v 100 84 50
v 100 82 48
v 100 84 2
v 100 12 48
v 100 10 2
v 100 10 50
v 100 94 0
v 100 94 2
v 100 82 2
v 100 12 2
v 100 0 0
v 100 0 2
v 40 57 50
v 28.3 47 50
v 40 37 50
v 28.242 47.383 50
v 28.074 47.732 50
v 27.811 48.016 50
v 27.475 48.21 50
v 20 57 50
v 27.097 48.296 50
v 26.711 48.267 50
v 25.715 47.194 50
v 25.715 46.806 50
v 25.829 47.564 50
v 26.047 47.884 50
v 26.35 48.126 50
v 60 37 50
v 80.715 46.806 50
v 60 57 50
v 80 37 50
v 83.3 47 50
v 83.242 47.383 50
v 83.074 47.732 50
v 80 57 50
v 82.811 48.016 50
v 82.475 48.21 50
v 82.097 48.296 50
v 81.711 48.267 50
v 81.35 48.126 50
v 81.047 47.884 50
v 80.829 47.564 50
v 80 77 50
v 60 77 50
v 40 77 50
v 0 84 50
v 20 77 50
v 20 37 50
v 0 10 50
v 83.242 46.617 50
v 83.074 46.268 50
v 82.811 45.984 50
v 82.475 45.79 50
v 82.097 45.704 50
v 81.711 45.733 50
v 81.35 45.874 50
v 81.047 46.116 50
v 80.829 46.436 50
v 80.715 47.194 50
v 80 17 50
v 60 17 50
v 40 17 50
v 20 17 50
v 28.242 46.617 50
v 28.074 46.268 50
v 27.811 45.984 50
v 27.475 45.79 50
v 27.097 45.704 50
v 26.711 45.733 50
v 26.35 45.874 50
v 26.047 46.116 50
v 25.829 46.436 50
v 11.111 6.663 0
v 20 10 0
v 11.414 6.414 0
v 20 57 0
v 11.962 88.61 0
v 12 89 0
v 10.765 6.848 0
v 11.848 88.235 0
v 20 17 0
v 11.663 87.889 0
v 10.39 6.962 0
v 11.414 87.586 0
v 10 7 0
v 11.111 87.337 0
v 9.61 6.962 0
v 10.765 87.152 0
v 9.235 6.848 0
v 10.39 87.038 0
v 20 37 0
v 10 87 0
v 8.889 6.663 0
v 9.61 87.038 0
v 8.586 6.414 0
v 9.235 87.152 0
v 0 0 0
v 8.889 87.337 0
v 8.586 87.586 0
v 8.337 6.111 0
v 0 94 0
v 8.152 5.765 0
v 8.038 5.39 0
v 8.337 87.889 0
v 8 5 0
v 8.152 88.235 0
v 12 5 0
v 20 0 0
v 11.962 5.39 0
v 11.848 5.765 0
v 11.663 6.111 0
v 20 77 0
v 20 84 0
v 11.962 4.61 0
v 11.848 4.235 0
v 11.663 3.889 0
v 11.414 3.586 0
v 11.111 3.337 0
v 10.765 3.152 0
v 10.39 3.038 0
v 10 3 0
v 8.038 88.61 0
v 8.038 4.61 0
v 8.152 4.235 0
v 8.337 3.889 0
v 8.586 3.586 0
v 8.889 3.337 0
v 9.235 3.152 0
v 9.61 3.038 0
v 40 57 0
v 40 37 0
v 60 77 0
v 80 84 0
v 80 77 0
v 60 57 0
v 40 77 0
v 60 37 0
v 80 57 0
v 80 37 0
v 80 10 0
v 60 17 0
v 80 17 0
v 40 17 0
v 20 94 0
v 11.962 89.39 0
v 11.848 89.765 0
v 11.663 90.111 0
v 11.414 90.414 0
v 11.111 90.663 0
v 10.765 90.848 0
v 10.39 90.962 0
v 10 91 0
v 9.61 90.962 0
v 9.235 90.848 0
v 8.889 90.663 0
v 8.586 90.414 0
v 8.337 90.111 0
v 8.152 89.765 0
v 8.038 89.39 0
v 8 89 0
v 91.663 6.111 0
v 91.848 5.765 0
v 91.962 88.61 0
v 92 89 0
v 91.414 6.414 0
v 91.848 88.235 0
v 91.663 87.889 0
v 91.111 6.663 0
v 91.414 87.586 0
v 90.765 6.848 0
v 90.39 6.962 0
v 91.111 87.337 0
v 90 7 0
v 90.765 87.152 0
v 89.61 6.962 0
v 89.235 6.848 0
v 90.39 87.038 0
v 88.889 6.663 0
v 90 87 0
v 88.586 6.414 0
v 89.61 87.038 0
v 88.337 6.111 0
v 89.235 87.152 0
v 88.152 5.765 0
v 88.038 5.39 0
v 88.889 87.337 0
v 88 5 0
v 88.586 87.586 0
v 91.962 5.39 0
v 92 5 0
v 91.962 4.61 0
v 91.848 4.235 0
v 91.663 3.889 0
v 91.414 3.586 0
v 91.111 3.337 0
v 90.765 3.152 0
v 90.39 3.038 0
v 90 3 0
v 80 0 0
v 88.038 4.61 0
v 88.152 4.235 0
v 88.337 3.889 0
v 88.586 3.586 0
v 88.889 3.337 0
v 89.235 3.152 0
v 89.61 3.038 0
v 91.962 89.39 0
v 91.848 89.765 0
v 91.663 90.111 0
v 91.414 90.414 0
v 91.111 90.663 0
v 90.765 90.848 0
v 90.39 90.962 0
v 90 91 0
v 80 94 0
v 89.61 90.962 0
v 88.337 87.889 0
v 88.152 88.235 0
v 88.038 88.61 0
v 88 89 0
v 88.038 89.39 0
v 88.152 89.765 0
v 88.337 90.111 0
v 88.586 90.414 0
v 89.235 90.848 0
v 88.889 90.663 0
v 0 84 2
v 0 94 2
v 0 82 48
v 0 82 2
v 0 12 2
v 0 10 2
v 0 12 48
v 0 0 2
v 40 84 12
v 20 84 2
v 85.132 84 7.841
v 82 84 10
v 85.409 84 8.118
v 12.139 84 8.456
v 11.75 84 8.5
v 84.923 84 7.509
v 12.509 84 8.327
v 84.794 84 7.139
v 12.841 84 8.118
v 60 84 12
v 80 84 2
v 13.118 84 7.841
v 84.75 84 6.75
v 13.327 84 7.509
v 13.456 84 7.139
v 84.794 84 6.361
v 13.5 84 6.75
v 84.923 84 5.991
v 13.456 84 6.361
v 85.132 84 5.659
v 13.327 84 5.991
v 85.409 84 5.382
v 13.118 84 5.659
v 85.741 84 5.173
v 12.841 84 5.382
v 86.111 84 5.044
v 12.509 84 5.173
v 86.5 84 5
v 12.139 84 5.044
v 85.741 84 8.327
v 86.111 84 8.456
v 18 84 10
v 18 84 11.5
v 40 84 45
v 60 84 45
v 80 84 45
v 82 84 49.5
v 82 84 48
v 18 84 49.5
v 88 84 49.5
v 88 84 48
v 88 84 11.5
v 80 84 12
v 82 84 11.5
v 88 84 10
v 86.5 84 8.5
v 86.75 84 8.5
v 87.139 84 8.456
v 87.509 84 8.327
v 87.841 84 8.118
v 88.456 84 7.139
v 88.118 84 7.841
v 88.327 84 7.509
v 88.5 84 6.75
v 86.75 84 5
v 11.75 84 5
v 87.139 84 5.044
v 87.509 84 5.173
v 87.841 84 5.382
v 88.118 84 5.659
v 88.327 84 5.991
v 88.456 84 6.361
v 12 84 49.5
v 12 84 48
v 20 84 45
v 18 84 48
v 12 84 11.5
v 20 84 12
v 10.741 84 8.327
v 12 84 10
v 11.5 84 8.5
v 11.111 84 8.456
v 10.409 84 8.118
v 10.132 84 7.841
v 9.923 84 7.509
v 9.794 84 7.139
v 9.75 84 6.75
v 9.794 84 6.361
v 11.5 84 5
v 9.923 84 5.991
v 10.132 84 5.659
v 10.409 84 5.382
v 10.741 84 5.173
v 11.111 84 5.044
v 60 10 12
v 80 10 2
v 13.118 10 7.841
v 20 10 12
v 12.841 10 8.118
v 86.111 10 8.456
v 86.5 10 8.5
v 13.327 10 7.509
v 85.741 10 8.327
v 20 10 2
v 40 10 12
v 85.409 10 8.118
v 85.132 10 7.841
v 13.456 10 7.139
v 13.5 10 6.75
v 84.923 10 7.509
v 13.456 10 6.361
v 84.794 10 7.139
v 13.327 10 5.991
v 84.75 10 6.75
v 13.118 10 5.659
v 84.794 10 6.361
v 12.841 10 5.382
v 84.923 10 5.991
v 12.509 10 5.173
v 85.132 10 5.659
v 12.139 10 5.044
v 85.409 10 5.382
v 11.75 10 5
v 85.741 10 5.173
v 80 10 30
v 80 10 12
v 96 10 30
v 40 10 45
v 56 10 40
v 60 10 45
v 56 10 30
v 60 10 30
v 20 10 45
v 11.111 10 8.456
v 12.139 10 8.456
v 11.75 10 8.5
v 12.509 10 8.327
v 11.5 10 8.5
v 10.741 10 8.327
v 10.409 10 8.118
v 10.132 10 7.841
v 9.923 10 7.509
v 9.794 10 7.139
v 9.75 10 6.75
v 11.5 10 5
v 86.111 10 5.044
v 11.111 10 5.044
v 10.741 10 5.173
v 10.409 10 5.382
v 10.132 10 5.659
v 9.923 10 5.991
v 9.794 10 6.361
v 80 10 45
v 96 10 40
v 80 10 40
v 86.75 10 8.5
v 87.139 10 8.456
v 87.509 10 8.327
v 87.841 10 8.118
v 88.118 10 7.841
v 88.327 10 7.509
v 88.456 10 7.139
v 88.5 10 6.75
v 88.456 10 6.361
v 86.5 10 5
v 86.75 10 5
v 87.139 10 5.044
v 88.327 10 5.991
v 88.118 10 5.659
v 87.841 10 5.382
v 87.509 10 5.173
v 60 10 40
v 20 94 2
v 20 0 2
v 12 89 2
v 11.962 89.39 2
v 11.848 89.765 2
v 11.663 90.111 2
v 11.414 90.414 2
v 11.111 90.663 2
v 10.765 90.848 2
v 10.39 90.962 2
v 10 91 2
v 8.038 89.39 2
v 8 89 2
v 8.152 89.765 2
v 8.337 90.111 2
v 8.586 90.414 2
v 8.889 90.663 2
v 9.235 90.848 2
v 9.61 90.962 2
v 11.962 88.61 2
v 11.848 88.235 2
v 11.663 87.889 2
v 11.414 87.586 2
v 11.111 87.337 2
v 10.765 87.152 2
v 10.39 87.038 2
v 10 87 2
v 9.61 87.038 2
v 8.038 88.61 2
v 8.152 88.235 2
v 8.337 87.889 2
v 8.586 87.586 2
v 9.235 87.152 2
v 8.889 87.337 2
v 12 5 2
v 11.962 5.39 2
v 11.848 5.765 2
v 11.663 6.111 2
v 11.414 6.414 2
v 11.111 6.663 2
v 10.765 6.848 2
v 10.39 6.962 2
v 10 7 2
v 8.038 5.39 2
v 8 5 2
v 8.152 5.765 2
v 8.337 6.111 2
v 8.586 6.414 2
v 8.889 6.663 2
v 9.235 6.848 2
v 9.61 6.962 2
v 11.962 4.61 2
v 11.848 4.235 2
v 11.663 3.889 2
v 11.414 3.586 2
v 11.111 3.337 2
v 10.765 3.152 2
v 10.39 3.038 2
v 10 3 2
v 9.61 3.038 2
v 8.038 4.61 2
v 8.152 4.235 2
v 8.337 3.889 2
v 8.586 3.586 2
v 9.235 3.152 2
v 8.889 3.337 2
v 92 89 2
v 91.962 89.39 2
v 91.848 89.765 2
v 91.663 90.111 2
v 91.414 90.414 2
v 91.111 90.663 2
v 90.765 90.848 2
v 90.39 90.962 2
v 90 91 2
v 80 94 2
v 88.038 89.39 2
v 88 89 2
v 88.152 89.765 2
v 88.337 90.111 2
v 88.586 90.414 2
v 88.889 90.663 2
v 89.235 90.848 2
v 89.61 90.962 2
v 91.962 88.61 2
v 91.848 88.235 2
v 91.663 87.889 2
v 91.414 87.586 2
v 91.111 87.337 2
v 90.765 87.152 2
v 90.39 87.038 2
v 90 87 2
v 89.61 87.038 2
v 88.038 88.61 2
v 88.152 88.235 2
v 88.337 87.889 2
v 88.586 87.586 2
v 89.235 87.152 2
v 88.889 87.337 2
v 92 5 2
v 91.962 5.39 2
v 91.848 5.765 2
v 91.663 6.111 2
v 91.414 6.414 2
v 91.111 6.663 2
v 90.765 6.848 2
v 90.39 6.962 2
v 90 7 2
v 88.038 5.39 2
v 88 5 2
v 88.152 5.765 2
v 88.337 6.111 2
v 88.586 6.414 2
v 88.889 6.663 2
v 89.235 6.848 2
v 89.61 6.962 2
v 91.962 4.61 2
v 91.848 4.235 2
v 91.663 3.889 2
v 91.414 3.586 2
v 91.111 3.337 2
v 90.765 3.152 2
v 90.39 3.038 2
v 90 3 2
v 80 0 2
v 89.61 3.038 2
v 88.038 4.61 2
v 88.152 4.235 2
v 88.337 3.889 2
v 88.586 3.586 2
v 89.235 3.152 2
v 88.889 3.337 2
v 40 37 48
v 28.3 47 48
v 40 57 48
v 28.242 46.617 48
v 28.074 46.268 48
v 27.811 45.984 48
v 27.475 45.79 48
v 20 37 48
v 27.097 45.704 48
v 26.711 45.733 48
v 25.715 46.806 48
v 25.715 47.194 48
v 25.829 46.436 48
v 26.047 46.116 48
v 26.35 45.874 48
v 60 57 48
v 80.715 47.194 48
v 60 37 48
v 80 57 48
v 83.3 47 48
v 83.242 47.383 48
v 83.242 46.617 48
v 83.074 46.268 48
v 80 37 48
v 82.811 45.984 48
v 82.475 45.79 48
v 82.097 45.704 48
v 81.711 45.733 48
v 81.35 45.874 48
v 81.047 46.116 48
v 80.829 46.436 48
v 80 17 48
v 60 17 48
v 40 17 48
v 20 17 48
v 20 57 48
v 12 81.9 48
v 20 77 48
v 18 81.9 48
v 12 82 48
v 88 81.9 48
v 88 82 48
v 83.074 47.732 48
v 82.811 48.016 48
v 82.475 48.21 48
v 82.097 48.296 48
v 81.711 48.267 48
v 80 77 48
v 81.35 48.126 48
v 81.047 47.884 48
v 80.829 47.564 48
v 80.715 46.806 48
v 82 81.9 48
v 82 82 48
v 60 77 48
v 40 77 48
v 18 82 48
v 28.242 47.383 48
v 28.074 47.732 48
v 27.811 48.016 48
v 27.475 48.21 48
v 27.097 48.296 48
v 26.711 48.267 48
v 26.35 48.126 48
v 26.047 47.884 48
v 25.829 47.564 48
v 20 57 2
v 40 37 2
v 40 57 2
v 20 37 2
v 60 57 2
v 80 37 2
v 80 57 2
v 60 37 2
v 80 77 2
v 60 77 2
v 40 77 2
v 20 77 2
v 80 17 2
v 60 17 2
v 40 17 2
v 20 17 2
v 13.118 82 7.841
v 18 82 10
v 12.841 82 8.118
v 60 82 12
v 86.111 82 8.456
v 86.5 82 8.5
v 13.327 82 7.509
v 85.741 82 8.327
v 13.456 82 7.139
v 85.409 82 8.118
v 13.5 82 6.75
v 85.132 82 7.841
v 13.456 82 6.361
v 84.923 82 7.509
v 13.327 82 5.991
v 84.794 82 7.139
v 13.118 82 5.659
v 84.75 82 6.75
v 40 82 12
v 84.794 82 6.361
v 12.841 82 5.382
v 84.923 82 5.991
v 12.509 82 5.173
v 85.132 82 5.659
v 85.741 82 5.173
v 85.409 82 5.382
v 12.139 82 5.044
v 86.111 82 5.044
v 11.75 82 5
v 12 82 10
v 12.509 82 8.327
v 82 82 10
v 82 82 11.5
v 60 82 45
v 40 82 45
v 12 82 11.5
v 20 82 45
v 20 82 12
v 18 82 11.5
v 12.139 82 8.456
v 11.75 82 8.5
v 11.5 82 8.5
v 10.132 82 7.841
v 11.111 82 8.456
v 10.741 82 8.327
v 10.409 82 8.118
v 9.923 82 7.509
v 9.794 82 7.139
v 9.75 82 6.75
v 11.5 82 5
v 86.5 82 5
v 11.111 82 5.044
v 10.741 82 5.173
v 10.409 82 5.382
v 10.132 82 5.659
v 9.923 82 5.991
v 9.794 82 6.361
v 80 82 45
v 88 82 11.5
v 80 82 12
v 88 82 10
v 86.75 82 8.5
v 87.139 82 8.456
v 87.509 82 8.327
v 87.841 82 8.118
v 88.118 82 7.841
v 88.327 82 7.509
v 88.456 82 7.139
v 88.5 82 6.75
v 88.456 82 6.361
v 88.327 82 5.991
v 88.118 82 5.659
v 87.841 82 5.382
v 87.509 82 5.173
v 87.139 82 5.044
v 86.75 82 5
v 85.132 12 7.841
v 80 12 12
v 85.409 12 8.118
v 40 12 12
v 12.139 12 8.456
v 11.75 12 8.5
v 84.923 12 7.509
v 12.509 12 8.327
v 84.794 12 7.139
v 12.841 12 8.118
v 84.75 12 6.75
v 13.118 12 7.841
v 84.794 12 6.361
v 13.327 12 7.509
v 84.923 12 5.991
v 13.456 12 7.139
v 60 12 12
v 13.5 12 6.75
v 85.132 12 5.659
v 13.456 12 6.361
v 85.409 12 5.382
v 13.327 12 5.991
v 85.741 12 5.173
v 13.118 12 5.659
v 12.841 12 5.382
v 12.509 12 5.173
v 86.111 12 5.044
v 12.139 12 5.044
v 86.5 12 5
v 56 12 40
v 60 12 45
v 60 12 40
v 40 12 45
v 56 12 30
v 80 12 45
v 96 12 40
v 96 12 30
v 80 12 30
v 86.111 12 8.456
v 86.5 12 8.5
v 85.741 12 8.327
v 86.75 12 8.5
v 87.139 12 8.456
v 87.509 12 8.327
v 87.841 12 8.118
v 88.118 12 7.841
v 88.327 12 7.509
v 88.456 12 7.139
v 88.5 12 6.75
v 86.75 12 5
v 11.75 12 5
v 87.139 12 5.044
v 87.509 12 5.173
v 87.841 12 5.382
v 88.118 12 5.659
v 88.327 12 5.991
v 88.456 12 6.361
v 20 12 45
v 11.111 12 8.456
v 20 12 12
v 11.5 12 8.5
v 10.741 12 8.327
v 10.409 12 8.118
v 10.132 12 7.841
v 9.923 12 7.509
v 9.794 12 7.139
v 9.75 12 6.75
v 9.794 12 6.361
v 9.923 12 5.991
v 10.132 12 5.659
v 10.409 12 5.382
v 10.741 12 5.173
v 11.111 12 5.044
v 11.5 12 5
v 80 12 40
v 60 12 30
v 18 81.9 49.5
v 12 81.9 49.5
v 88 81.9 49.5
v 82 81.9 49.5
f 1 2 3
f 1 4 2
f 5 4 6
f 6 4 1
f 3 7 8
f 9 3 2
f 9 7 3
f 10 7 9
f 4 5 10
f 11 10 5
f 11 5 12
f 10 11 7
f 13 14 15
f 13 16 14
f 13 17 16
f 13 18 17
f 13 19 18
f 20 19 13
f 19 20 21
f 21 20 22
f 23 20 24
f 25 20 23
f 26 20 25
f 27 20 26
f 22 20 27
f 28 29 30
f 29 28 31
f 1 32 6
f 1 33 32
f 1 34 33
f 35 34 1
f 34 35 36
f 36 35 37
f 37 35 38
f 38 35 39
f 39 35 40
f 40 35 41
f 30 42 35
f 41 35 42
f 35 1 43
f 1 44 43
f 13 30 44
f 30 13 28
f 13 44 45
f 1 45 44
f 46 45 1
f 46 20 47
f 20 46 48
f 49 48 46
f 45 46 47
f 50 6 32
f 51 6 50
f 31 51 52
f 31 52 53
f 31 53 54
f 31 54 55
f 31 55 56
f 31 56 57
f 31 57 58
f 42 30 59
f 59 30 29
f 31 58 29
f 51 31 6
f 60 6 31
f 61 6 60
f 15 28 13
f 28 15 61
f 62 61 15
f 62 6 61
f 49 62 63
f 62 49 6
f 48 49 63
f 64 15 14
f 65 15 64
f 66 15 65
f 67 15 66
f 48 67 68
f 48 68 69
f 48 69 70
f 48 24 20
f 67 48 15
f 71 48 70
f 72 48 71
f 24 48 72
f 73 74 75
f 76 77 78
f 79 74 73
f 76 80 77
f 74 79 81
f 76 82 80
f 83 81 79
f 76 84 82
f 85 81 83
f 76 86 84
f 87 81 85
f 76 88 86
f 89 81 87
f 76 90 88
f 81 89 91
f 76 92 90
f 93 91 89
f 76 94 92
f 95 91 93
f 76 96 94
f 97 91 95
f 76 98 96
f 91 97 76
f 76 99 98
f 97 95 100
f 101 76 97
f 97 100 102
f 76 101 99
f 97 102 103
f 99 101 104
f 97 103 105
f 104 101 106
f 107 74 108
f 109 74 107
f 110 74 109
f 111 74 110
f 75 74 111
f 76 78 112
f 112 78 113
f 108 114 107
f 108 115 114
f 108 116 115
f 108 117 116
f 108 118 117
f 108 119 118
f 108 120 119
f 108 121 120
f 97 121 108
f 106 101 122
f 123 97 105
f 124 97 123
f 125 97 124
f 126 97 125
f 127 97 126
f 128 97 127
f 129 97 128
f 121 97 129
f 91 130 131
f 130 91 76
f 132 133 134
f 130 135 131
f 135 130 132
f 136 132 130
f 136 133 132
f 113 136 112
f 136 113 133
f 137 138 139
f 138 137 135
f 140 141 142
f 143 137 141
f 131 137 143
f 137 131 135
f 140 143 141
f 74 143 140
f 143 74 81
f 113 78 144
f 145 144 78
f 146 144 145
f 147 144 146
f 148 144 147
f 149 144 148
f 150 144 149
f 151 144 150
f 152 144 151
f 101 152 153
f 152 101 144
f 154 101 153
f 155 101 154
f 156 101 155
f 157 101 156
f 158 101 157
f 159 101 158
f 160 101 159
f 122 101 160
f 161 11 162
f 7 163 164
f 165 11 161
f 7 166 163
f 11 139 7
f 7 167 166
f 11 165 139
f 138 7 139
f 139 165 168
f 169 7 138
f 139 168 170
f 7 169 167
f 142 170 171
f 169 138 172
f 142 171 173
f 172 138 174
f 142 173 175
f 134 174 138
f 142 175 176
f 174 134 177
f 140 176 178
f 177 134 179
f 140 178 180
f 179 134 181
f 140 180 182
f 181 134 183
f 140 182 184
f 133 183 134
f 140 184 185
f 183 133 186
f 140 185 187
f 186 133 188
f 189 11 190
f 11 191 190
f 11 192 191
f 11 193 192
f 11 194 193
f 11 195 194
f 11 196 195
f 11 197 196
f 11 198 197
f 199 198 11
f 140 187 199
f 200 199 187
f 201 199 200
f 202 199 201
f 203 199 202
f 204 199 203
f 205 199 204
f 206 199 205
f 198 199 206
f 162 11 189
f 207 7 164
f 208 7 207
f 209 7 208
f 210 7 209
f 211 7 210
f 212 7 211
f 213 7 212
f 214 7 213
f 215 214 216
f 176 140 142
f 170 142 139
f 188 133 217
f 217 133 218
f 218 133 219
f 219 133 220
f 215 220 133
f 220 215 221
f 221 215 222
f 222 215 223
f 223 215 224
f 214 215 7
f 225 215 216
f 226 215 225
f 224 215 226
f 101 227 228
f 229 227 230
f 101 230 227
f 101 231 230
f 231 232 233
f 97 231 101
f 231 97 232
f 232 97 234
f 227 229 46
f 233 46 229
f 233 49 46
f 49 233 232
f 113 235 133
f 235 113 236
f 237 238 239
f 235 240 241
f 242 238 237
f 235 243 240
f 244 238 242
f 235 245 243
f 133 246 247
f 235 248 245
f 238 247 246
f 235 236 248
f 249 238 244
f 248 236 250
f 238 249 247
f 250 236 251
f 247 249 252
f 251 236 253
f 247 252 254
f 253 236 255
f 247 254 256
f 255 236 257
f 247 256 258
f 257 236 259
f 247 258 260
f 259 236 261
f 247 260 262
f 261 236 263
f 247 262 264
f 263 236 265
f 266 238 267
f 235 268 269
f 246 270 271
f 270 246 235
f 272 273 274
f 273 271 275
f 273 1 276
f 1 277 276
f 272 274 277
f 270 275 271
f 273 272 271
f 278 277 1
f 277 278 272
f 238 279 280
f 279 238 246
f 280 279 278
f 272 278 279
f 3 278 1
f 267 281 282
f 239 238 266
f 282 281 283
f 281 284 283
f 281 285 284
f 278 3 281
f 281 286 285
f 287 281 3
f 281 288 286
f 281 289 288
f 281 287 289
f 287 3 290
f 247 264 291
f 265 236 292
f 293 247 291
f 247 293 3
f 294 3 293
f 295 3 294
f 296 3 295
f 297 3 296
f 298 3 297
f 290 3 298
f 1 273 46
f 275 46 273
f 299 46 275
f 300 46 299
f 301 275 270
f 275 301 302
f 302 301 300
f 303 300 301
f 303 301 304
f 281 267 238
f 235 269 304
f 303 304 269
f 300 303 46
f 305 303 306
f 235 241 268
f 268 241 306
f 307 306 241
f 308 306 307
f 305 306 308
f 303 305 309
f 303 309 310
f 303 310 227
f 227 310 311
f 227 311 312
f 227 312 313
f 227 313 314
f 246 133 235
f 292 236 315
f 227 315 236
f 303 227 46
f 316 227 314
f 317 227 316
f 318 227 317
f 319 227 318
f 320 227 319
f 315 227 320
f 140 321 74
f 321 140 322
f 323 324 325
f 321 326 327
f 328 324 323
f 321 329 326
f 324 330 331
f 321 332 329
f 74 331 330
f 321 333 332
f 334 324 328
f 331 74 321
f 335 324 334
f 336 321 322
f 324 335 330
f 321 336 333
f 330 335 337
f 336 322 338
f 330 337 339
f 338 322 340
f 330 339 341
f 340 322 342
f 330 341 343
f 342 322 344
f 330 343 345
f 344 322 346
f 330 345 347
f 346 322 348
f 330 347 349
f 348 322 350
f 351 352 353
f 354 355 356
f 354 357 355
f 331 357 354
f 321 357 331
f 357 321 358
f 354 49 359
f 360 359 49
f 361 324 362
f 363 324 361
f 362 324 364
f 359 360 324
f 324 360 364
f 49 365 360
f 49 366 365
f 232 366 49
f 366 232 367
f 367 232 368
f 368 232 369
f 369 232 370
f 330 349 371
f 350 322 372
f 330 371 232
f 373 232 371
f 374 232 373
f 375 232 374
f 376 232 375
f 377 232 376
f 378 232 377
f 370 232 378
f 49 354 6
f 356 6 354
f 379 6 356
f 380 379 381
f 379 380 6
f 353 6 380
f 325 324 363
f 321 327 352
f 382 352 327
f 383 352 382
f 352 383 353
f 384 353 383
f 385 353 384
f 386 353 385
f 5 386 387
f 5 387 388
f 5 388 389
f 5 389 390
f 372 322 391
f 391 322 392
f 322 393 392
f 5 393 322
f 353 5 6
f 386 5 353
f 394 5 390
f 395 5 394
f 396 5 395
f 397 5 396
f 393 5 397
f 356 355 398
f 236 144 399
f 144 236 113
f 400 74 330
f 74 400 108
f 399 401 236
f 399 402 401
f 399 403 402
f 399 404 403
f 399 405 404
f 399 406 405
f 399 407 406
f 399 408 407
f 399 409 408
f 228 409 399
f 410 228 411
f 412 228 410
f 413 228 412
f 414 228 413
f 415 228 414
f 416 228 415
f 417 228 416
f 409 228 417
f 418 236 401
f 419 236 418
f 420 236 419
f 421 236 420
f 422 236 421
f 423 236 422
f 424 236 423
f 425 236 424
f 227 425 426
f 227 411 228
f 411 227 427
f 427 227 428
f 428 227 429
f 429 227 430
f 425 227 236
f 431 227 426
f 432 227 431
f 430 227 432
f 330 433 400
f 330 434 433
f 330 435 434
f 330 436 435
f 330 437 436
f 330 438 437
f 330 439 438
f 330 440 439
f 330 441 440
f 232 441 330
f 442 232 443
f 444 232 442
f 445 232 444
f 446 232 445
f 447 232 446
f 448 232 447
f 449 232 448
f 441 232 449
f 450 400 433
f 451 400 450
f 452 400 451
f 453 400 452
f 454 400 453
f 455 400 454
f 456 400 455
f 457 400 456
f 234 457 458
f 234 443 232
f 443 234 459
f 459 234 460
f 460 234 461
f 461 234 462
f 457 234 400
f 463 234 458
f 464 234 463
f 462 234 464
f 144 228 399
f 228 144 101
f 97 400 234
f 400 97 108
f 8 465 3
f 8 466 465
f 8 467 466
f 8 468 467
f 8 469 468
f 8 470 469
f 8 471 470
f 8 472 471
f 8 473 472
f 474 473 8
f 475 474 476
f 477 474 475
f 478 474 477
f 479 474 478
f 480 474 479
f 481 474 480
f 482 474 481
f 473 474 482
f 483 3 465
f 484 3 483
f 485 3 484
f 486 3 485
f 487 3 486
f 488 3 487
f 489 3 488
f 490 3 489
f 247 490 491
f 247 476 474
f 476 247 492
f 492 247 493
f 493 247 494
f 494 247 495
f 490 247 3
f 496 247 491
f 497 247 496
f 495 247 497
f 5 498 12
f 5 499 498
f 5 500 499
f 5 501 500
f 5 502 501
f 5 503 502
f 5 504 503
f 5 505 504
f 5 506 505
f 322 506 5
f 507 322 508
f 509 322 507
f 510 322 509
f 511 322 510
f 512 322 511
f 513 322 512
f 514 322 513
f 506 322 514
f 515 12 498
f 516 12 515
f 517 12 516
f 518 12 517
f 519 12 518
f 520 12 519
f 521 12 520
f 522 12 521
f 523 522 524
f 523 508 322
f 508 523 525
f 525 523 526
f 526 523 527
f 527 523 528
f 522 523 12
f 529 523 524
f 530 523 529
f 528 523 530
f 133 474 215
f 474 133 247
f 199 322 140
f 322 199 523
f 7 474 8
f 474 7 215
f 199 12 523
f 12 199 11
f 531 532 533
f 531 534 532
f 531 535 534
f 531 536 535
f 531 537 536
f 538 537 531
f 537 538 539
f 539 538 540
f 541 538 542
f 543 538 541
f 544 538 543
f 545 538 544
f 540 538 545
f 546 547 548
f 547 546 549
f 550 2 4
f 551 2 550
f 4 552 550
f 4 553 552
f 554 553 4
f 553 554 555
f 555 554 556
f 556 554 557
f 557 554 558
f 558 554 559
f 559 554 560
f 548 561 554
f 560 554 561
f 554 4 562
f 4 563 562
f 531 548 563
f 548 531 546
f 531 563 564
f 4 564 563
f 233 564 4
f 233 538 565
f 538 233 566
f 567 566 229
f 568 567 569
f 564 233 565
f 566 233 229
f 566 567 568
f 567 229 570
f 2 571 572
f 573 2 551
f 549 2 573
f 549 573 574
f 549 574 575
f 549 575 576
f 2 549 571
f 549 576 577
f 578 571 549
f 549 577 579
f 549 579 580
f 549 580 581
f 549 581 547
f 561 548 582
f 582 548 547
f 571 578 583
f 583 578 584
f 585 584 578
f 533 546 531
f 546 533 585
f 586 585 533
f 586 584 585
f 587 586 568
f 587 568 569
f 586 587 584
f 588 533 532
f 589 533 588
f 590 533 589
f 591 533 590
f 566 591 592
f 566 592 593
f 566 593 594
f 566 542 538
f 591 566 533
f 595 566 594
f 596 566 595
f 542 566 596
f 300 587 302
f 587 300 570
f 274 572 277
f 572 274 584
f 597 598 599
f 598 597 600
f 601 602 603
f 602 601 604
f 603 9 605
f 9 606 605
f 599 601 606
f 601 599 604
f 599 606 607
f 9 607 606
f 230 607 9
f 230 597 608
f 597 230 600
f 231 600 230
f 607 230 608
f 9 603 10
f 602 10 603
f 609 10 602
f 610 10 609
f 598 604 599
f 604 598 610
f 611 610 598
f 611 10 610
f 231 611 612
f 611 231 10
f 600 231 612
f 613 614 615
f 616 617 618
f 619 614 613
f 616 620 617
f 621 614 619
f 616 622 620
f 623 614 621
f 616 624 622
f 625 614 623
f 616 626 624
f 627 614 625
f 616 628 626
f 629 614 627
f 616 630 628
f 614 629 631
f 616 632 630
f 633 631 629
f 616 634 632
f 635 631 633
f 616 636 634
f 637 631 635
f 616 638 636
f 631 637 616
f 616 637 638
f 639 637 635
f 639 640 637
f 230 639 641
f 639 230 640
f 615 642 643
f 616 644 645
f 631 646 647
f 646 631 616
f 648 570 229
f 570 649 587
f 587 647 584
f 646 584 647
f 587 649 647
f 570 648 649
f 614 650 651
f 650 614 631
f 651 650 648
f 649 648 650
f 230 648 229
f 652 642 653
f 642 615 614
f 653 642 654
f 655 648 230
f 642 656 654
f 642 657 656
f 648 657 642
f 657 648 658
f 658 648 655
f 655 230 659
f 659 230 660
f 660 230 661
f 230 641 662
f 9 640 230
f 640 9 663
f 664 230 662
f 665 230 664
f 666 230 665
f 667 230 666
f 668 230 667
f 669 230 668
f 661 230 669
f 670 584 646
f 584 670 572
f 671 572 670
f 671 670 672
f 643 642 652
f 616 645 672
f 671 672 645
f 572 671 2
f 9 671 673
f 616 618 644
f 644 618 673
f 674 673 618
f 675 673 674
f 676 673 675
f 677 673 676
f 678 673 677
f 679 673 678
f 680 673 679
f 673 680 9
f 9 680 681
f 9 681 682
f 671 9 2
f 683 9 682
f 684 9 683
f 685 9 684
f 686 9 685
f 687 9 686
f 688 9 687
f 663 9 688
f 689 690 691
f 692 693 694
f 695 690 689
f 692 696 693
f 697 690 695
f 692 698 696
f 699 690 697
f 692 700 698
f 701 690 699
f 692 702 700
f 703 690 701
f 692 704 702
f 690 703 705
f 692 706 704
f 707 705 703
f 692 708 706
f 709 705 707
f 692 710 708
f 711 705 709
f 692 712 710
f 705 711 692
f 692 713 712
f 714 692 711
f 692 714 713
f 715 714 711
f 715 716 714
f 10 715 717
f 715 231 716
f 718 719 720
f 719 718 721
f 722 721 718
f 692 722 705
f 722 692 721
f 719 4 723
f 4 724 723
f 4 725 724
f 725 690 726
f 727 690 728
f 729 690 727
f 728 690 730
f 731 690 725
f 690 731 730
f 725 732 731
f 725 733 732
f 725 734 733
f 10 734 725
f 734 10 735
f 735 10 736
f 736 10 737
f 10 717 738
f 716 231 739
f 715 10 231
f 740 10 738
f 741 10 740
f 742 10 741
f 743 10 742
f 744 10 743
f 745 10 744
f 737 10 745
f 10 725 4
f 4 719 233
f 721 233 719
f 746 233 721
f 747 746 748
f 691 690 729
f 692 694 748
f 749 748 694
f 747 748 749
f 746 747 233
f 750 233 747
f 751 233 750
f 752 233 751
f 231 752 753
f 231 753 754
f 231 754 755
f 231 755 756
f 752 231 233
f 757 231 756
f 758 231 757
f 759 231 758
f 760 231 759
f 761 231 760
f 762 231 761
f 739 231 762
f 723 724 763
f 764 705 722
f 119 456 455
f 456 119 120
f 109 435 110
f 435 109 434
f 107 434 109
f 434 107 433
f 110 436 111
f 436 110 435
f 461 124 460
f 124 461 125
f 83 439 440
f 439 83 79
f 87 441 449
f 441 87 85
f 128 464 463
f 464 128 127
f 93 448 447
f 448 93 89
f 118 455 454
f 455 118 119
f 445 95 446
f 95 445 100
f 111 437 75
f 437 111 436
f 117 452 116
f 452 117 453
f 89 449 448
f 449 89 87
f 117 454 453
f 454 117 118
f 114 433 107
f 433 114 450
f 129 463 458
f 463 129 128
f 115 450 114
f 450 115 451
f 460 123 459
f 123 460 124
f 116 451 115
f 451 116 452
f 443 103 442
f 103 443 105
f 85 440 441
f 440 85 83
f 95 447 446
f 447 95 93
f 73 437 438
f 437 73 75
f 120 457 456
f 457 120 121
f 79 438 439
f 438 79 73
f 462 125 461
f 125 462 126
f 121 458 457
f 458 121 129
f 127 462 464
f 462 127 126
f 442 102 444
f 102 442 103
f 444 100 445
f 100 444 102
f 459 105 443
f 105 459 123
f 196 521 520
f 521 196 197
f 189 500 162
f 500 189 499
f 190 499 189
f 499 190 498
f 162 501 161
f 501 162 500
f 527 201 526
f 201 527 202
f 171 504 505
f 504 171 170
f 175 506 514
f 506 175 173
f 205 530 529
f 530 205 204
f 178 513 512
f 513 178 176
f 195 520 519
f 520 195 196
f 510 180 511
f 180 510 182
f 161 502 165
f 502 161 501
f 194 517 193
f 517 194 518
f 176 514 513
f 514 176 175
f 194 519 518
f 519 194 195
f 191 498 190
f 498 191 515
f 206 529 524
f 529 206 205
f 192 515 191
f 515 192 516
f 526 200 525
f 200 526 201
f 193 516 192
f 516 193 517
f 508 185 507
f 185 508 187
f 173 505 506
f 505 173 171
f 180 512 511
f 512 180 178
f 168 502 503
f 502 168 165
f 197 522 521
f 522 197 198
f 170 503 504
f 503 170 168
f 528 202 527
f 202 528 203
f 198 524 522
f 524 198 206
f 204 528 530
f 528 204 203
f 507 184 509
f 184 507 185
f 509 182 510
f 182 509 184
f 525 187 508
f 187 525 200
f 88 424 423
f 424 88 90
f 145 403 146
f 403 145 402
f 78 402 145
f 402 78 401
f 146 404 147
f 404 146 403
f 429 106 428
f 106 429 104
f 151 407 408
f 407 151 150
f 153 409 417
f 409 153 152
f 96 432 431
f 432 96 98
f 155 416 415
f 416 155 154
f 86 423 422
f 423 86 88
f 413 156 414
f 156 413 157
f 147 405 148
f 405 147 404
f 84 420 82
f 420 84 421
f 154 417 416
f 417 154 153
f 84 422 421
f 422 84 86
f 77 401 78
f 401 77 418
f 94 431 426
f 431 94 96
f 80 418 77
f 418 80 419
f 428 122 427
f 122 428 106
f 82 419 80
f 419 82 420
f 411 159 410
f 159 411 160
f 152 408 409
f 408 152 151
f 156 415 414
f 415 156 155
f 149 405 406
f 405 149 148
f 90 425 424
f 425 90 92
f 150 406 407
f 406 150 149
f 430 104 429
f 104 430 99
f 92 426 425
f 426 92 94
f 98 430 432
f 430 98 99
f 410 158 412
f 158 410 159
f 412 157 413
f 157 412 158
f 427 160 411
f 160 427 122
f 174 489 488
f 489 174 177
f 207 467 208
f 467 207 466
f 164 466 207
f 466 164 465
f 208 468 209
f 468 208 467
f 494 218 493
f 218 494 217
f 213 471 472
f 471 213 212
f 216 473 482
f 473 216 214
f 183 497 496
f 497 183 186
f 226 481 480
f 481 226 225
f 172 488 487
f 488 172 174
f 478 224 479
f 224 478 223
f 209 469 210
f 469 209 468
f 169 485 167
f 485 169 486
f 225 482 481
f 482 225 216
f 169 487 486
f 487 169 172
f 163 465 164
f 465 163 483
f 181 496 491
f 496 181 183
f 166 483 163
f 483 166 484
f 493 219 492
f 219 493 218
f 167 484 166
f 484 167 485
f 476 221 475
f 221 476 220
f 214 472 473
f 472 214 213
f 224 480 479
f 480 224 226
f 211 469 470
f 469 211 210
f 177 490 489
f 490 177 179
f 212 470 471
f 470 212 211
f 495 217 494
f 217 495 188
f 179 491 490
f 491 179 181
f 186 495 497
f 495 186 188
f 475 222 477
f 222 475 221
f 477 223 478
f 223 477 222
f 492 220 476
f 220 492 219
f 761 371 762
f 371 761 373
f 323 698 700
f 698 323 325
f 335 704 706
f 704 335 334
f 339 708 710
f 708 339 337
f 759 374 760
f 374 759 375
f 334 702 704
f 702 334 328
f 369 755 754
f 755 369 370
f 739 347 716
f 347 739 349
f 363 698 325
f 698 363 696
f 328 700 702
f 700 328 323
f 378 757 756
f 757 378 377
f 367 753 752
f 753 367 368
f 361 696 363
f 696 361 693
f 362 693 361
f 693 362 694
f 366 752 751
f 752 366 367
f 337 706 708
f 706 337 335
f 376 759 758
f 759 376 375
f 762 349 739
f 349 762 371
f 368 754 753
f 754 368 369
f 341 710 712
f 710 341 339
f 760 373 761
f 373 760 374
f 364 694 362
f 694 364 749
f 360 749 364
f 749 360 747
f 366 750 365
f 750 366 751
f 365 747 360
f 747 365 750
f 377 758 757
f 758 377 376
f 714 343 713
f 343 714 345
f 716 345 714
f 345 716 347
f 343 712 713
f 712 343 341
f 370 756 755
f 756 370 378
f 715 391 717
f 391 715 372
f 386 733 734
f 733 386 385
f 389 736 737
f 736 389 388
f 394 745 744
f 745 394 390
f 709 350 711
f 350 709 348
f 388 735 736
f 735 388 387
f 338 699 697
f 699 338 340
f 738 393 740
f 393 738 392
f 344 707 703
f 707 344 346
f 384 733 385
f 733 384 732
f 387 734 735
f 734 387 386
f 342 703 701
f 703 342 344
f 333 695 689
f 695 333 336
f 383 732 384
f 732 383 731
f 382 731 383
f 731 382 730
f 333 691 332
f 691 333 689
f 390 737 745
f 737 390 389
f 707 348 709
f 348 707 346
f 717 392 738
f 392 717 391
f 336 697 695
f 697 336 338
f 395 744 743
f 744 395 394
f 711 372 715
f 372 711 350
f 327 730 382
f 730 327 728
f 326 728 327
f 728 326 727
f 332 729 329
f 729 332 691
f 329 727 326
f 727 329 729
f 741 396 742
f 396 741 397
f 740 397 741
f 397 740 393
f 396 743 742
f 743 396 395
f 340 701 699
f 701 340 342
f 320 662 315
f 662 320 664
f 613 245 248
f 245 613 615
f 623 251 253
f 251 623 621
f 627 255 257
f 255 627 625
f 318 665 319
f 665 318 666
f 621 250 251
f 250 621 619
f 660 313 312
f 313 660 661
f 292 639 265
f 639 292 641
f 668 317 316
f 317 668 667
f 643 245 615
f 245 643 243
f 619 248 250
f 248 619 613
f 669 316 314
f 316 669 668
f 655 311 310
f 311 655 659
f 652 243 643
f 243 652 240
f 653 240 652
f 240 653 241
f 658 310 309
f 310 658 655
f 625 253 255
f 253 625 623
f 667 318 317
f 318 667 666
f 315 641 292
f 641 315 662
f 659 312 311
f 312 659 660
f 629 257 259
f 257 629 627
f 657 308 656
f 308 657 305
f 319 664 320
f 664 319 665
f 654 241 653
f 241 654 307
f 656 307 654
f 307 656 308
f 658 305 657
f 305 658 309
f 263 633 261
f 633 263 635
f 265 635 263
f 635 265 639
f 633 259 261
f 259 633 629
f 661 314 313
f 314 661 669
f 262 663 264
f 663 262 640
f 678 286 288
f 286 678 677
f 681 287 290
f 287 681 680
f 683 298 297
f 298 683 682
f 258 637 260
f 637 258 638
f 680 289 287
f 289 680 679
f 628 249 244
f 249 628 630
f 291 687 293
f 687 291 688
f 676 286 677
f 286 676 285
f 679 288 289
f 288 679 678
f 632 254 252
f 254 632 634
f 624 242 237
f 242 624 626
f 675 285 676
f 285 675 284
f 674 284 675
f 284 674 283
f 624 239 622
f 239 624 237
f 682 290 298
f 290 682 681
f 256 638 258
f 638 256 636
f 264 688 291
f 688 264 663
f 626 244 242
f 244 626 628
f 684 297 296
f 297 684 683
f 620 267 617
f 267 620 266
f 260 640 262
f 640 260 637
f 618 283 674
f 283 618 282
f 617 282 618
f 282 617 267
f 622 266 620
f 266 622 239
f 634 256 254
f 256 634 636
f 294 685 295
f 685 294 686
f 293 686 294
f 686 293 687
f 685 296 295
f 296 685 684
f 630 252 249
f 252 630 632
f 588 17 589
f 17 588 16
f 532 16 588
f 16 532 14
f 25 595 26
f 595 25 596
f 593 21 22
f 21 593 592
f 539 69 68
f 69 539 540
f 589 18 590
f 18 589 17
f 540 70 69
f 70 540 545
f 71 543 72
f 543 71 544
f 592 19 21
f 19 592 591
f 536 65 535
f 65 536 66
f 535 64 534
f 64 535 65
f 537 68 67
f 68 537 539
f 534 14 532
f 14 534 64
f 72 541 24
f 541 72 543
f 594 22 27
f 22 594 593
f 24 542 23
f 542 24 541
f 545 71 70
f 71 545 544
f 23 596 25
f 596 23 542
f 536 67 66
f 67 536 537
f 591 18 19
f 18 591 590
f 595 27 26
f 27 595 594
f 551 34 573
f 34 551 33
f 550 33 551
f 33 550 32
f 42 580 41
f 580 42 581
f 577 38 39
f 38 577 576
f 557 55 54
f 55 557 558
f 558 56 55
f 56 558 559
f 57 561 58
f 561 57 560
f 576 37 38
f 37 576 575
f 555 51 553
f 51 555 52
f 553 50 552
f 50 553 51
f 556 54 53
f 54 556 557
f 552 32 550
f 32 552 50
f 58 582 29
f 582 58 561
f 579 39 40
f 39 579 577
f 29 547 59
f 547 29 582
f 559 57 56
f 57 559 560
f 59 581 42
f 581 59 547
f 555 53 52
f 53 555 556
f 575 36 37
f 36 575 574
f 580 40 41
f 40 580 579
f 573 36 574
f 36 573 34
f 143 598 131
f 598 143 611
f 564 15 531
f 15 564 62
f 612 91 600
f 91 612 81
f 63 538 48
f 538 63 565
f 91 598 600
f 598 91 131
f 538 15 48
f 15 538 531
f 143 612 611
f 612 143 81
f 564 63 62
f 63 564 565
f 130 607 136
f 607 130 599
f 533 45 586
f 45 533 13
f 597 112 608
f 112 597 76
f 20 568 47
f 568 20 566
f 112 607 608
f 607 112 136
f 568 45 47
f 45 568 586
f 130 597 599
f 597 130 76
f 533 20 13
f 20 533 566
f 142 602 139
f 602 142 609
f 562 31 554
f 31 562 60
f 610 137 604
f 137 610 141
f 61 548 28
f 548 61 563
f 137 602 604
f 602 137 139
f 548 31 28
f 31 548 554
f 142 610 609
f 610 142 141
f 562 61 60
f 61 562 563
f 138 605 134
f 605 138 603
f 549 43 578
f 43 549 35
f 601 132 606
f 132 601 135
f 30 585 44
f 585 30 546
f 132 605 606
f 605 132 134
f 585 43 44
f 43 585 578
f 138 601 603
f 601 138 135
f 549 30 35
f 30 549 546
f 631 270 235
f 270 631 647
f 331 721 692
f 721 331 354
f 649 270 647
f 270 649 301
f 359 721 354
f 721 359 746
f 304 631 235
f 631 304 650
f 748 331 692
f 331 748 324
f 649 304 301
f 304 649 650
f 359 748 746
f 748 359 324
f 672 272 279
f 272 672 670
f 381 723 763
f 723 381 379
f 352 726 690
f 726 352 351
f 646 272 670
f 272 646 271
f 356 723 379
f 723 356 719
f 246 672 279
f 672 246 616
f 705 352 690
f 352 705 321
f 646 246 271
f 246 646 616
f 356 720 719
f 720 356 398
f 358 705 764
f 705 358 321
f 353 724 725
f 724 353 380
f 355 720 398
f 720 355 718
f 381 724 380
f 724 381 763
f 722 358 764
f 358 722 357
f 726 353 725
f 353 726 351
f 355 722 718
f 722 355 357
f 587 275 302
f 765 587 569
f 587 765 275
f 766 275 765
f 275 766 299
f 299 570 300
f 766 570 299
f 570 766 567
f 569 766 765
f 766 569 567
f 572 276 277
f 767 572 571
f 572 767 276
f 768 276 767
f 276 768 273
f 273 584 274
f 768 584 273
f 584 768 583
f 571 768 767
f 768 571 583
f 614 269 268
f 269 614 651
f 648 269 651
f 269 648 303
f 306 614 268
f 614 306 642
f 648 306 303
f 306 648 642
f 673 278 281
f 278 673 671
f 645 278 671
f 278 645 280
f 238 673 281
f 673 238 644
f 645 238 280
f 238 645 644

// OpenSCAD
/* box / bracket for Pi + 2.5inch SSD + hub.
 HDD is 70x100 mm with 2.5mm screws 74-80mm apart use 3mmx5mm slots
 Pi has holes that are 55 mm apart use 2.5mm holes and tap for 3mm.
 hub will cable tie to the side and is 45 mm wide.
 it will mount to the underside with gull wing tabs
 generally 2mm thick.
*/
$fa=1;
$fs=0.4;

module roundSlotXZ(r,l,w){
  points = [[r,0,r], [(l-(2*r)),0,r] ];
    hull() {
        for(p=points) {
	  translate(p) rotate([270,0,0]) cylinder(r=r,h=w);
            }
        }
    }

module piMount() {
  difference() {
    union() {
      // outer box
      translate([0,10,0]) cube([100,74,50]);
      cube([20,94,2]);
      translate([80,0,0]) cube([20,94,2]);
    }
    // hollow out main part
      translate([-0.1,12,2]) cube([100.2,70,46]);
      // holes on the 4 tabs
      translate([10,5,-0.10]) cylinder(r=2,h=2.2);
      translate([90,5,-0.10]) cylinder(r=2,h=2.2);
      translate([10,89,-0.10]) cylinder(r=2,h=2.2);
      translate([90,89,-0.10]) cylinder(r=2,h=2.2);
      // slots for the 4 ssd screws
      translate([10,9.9,5]) roundSlotXZ(1.75,5,2.2);
      translate([85,9.9,5]) roundSlotXZ(1.75,5,2.2);
      translate([10,81.9,5]) roundSlotXZ(1.75,5,2.2);
      translate([85,81.9,5]) roundSlotXZ(1.75,5,2.2);
    // holes for the pi mount
    translate([27,47,47.9]) cylinder(h=2.2,r=1.3);
    translate([82,47,47.9]) cylinder(h=2.2,r=1.3);
    // hollow out the base and top
    translate([20,17,-0.1]) cube([20,20,52.2]);
    translate([20,57,-0.1]) cube([20,20,52.2]);
    translate([60,17,-0.1]) cube([20,20,52.2]);
    translate([60,57,-0.1]) cube([20,20,52.2]);
    // thin sides
      translate([20,9.9,12]) cube([20,74.2,33]);
      translate([60,9.9,12]) cube([20,74.2,33]);
      // slot for power and hdmi
     translate([42+14,9.9,30]) cube([40,2.2,10]);
     // slots for cable ties for usb hub
     translate([12,81.9,48]) cube([6,2.2,1.5]);
     translate([82,81.9,48]) cube([6,2.2,1.5]);
     translate([12,81.9,10]) cube([6,2.2,1.5]);
     translate([82,81.9,10]) cube([6,2.2,1.5]);

   
  }
}
piMount();
